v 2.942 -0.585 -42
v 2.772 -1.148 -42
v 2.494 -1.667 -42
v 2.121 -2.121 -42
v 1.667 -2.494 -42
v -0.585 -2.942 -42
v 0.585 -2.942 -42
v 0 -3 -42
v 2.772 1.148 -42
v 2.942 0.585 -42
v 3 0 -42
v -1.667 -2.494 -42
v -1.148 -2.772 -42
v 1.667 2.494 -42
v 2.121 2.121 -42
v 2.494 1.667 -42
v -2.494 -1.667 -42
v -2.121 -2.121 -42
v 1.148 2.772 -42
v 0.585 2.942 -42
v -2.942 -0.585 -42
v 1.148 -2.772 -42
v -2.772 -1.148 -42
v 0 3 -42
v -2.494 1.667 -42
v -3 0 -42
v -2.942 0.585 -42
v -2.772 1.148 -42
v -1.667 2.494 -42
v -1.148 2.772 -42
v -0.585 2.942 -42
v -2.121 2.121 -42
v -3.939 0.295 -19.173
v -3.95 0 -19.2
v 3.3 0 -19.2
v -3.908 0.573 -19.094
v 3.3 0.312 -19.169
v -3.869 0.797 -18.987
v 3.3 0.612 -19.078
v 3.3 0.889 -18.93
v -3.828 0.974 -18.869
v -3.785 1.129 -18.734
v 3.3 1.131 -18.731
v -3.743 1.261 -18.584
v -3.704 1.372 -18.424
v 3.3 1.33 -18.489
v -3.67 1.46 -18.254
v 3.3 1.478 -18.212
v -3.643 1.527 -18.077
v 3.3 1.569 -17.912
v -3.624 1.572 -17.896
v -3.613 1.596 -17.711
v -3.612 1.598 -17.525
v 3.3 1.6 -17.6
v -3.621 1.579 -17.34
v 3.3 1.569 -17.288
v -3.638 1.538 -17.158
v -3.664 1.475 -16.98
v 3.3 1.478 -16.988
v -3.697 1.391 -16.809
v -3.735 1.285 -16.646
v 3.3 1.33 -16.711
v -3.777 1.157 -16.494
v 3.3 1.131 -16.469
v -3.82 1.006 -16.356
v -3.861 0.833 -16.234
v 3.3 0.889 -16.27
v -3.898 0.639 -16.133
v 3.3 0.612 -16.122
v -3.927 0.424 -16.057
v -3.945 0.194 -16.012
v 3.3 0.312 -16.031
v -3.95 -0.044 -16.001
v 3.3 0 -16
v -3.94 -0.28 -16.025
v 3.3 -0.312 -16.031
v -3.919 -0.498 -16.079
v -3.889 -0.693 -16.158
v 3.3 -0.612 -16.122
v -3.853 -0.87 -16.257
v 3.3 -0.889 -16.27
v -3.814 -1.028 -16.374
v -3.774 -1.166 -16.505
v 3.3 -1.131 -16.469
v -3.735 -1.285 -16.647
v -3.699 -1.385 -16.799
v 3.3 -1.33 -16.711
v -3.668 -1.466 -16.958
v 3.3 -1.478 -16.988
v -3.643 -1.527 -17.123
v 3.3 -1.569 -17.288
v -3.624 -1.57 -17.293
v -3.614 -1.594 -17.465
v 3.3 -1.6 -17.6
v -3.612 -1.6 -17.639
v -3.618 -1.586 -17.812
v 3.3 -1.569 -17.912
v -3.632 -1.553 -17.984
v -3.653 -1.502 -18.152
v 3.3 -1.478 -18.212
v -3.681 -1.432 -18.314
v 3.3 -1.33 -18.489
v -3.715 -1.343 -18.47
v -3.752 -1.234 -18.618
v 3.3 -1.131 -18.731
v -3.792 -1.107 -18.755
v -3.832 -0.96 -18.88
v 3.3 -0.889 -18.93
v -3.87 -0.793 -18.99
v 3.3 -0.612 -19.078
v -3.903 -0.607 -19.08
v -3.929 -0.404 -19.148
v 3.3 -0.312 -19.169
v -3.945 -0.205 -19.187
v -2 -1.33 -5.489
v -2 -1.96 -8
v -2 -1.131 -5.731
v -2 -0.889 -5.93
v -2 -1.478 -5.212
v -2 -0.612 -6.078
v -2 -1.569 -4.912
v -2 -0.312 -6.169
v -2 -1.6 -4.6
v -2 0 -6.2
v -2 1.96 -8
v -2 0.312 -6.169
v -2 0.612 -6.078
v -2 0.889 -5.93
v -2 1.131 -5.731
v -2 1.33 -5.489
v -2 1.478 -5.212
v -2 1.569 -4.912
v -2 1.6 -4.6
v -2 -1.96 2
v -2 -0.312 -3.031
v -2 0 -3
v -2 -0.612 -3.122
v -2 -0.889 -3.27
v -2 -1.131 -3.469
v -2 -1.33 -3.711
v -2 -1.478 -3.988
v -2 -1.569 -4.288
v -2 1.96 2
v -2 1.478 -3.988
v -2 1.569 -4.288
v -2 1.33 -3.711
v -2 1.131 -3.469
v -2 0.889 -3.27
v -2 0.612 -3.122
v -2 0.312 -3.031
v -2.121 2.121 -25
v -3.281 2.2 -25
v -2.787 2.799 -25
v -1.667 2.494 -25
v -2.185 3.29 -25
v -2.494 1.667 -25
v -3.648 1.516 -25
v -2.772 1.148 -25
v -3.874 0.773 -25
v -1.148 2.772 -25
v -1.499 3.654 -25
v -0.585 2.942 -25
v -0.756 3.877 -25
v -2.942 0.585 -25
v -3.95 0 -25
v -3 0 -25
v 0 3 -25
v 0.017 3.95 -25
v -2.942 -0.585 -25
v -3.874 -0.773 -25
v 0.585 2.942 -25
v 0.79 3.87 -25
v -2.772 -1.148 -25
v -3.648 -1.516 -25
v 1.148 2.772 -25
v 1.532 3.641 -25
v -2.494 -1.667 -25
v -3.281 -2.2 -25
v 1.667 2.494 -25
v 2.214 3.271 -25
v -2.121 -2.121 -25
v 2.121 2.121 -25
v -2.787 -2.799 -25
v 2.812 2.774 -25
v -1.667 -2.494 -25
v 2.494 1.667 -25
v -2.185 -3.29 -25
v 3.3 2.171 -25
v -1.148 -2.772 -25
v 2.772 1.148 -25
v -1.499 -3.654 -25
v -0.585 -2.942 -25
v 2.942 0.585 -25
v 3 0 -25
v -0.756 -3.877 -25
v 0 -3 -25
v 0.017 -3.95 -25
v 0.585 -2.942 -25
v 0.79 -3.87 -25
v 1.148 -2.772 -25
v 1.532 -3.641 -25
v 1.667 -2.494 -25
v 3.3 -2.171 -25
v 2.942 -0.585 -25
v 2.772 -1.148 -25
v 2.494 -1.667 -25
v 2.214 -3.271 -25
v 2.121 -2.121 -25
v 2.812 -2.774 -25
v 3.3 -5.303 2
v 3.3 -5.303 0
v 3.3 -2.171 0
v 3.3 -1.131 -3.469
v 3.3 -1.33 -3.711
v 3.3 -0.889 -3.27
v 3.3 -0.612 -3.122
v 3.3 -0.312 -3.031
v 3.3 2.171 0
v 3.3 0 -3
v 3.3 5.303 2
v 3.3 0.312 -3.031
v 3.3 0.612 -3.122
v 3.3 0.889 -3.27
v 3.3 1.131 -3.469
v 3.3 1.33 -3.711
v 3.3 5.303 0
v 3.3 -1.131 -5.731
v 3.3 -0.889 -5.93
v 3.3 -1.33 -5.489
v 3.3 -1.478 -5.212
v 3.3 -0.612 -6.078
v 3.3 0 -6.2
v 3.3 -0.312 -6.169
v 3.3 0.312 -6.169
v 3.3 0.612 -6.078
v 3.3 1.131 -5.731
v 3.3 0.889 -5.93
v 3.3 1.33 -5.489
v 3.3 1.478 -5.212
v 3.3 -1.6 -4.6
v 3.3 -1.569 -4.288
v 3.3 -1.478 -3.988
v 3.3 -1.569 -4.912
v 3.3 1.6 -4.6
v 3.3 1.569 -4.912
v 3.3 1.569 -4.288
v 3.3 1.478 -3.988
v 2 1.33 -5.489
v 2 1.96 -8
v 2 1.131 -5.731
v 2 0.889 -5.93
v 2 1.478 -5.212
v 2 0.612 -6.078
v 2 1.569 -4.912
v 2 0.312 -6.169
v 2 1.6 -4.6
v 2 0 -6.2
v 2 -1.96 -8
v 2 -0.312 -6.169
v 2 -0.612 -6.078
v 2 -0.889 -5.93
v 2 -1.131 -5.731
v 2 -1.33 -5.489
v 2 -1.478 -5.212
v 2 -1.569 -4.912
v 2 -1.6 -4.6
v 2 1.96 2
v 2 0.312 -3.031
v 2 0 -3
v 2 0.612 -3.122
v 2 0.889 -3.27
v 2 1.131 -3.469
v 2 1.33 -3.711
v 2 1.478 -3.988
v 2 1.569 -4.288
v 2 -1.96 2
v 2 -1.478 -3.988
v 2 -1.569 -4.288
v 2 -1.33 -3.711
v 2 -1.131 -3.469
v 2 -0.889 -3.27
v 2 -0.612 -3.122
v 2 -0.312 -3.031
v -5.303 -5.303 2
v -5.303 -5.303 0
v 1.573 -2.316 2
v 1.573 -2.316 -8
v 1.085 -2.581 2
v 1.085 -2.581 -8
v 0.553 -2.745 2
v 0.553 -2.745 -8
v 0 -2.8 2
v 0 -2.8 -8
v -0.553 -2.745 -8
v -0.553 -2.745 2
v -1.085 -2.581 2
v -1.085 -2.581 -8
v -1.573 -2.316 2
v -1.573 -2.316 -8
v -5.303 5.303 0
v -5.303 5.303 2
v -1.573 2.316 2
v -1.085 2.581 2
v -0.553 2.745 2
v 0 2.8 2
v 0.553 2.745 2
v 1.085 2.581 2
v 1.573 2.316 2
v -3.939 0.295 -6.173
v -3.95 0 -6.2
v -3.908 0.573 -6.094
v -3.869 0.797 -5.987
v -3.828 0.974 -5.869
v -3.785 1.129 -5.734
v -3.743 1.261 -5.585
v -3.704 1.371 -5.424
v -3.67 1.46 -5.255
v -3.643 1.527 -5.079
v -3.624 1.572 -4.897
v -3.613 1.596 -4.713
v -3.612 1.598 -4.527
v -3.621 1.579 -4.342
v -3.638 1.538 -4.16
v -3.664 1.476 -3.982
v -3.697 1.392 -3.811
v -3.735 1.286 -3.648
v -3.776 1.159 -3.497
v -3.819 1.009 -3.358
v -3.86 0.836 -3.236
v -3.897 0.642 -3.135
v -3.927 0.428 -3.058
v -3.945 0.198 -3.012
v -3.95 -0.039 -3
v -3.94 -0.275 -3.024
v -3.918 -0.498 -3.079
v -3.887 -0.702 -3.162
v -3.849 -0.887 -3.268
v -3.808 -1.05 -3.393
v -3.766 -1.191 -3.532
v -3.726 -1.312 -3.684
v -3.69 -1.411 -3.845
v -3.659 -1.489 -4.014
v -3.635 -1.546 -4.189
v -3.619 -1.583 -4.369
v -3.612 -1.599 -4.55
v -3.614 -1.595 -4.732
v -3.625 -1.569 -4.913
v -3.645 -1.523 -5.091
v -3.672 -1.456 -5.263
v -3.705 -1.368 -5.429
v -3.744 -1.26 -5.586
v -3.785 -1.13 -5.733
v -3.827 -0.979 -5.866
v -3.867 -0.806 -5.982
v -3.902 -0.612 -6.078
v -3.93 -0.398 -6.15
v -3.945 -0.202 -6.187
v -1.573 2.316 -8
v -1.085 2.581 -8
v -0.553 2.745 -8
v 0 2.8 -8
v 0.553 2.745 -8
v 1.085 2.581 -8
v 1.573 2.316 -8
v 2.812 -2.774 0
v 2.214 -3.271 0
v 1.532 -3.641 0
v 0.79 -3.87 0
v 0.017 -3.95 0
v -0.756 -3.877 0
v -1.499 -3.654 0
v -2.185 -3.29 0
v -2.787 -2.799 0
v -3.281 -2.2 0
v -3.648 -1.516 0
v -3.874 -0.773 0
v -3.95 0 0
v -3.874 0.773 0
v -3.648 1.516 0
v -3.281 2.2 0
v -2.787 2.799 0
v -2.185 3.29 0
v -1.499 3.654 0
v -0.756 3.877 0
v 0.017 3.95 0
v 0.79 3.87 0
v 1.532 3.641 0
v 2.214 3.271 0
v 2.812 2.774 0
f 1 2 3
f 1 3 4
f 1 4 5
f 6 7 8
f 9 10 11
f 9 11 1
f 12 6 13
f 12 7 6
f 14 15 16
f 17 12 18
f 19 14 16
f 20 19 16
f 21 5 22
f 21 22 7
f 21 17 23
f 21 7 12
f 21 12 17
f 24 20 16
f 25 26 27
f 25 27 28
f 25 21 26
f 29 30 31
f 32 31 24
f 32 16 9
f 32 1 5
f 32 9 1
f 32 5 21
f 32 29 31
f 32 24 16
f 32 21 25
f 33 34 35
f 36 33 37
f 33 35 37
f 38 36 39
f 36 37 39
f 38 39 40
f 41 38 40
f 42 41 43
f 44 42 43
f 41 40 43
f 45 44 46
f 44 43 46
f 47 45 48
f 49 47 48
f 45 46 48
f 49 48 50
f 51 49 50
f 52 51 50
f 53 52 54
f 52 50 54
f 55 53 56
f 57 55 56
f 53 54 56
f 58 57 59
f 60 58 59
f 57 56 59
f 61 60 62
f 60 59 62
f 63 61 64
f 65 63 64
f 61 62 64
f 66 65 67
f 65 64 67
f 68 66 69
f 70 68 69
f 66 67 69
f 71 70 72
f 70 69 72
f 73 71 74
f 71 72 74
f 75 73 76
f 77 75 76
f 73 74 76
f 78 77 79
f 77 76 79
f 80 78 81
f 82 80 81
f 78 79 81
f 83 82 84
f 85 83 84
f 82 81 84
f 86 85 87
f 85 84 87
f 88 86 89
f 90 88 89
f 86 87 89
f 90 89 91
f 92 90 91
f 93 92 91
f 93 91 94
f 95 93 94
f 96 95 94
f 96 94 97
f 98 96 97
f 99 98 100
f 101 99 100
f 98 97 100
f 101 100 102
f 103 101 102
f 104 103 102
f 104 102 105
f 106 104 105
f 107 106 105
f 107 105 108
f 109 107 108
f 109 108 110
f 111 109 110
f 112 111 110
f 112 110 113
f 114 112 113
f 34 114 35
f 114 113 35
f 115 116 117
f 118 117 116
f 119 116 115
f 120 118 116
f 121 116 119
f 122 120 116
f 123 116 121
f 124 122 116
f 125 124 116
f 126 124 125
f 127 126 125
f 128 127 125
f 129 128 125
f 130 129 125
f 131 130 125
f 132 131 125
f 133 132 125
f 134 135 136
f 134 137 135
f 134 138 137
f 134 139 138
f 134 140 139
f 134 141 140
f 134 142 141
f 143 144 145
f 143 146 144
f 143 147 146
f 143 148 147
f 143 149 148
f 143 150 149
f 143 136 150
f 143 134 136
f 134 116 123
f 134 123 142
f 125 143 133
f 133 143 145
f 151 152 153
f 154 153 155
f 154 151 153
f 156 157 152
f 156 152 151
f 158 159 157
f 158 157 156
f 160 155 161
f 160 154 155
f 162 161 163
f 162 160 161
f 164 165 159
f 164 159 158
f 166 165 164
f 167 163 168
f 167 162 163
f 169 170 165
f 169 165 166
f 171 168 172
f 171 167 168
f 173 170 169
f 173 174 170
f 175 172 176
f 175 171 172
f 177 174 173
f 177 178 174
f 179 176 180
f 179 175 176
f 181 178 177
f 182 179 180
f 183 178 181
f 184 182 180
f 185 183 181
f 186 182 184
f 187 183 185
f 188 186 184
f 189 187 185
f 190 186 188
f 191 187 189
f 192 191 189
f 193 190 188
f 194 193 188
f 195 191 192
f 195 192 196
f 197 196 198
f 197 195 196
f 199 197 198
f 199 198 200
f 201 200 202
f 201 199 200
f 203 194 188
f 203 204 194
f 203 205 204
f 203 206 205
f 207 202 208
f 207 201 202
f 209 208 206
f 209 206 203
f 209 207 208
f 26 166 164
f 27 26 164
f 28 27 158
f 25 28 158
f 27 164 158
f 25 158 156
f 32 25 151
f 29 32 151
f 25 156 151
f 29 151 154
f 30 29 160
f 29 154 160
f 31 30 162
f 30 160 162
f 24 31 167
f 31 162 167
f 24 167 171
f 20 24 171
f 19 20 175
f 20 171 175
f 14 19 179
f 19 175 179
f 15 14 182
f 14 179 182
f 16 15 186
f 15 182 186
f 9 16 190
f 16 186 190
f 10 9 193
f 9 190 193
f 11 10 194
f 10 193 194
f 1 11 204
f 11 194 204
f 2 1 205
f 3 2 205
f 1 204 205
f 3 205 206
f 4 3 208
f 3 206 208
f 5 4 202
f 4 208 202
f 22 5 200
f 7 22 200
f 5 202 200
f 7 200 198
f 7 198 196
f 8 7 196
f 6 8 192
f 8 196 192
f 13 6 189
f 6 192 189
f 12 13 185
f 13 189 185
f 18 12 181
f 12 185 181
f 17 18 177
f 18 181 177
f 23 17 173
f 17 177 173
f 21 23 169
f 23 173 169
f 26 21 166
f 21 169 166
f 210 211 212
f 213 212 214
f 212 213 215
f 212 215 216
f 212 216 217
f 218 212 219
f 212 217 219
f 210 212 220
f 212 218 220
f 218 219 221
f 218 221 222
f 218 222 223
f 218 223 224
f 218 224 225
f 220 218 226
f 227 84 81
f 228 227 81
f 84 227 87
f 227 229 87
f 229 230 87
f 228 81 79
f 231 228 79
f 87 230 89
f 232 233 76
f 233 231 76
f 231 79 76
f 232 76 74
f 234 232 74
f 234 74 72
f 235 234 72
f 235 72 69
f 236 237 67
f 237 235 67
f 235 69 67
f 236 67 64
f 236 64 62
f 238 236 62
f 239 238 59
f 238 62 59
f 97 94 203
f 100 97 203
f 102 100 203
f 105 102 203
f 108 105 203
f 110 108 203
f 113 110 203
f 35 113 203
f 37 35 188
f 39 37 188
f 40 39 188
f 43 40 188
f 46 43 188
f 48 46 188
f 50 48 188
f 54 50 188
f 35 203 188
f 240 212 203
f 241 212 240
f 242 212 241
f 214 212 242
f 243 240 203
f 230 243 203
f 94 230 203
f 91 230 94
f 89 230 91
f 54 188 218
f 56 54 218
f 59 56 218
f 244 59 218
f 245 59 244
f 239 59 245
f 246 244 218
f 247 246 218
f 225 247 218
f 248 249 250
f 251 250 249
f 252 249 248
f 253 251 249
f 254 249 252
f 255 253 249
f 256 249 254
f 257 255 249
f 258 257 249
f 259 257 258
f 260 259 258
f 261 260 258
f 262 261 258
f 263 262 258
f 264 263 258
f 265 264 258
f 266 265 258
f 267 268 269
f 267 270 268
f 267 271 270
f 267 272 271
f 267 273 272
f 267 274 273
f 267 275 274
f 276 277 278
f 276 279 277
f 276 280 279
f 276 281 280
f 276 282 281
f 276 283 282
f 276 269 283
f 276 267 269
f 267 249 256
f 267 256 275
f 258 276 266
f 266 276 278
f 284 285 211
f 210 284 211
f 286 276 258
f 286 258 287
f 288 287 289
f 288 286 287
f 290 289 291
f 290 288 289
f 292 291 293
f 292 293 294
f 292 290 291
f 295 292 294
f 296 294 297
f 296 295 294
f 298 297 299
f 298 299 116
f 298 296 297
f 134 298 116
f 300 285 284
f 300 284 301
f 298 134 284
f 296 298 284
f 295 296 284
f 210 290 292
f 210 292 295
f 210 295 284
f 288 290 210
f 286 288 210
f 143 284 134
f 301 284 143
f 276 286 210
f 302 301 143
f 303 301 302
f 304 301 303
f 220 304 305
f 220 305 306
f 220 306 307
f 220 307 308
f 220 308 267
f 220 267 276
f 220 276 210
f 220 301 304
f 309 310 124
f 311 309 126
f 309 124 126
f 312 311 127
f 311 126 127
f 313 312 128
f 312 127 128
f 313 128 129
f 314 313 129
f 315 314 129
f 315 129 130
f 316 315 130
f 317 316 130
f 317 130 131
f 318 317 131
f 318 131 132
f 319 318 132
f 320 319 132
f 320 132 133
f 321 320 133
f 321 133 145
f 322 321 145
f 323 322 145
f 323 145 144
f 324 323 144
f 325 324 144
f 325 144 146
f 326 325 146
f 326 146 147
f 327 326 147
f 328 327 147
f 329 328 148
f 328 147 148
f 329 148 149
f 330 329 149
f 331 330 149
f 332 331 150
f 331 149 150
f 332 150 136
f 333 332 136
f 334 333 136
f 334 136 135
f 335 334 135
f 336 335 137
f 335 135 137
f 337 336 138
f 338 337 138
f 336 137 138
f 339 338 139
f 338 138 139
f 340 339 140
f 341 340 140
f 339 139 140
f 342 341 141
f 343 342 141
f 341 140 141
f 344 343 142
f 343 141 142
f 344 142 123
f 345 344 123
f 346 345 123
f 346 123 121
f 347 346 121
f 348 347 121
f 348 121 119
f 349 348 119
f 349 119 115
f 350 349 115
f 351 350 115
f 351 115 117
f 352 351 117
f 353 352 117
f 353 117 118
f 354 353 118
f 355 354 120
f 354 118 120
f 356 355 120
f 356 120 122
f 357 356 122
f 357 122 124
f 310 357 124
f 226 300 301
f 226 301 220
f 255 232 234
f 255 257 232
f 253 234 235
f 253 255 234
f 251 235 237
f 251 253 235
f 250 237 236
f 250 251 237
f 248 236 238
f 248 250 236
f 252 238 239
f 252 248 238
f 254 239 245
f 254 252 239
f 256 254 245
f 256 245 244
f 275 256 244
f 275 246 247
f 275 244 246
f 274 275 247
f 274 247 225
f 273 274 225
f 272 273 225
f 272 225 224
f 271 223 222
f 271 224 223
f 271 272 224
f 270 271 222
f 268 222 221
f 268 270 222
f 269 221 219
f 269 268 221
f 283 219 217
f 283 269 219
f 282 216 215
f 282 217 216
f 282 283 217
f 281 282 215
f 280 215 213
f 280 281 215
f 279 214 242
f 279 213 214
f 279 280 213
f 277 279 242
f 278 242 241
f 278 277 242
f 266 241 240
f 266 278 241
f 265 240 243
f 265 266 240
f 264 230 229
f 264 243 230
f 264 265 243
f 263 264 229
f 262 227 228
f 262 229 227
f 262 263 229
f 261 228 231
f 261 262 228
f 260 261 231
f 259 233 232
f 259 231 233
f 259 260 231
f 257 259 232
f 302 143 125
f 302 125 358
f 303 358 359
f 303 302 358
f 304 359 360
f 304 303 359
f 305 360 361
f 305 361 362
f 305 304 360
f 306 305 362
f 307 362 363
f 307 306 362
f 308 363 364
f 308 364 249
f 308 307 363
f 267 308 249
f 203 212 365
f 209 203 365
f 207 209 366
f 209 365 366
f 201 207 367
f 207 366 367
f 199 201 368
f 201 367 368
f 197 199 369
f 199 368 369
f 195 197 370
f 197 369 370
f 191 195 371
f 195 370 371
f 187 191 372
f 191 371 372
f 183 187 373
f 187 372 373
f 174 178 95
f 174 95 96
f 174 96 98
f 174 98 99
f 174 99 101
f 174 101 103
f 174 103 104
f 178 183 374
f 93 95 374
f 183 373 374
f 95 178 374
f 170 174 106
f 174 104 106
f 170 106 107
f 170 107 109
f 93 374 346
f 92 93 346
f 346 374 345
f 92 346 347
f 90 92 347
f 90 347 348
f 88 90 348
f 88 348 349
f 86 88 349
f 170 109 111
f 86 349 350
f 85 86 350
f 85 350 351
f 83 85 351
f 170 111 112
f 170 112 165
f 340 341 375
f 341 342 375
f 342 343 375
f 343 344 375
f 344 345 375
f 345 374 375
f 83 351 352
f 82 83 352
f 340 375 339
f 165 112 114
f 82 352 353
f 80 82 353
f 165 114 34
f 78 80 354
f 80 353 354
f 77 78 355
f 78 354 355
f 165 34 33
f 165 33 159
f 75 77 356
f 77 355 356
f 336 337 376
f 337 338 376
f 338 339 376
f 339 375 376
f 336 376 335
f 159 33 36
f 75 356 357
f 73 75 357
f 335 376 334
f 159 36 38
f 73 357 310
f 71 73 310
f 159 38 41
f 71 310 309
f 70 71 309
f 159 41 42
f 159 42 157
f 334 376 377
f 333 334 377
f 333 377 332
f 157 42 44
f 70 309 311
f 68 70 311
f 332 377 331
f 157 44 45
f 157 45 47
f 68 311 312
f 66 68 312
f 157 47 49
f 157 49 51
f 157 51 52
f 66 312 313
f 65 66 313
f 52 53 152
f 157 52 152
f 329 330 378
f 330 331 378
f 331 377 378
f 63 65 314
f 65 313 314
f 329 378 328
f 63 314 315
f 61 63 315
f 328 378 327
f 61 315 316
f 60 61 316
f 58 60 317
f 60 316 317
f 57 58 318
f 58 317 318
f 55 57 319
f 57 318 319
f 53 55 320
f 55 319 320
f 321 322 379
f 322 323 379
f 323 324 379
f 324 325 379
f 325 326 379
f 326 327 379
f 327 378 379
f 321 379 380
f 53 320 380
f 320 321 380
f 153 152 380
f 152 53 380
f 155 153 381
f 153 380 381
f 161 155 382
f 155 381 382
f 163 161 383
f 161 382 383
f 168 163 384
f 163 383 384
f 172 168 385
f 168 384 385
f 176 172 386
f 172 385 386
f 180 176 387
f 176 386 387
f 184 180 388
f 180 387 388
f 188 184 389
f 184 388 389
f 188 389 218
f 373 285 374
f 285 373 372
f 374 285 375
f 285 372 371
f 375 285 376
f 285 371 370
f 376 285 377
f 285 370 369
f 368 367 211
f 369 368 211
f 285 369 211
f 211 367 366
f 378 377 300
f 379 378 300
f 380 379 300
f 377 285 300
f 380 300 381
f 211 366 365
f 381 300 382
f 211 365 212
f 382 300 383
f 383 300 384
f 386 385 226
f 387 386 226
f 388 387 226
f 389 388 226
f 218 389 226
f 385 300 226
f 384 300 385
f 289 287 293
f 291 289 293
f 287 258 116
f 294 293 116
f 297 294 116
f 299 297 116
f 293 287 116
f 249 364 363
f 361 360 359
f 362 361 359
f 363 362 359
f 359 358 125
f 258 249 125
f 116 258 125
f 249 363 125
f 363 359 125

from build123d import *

# Parameters (mm, degrees)
IZIM1_W                     = 10.606601718
IZIM1_H                     = 10.606601718
Y_KSEKLIK_EKSTR_ZYON1_DEPTH = 2
IZIM2_R                     = 3.95
Y_KSEKLIK_EKSTR_ZYON2_DEPTH = 25
KES_EKSTR_ZYON1_DEPTH       = 10
IZIM5_R                     = 1.6
KES_EKSTR_ZYON3_DEPTH       = 26
IZIM8_W                     = 5
IZIM8_H                     = 13.621024602
KES_EKSTR_ZYON4_DEPTH       = 29.022312538
SKETCH2_R                   = 3
BOSS_EXTRUDE1_DEPTH         = 17


with BuildPart() as part:
    # Çizim1 → Yükseklik-Ekstrüzyon1 (new body)
    with BuildSketch(Plane.XY):
        Rectangle(IZIM1_W, IZIM1_H)
    extrude(amount=Y_KSEKLIK_EKSTR_ZYON1_DEPTH)

    # Çizim2 → Yükseklik-Ekstrüzyon2 (add)
    with BuildSketch(Plane(origin=(0, 0, 0), x_dir=(-1, 0, 0), z_dir=(0, 0, -1))):
        with Locations(Location((0, 0, 0), (0, 0, 180))):
            Circle(IZIM2_R)
    extrude(amount=Y_KSEKLIK_EKSTR_ZYON2_DEPTH)

    # Çizim3 → Kes-Ekstrüzyon1 (cut)
    with BuildSketch(Plane.XY.offset(2)):
        with BuildLine():
            Line((-2, -1.959591794), (-2, 1.959591794))
            ThreePointArc((-2, 1.959591794), (0, 2.8), (2, 1.959591794))
            Line((2, 1.959591794), (2, -1.959591794))
            ThreePointArc((2, -1.959591794), (0, -2.8), (-2, -1.959591794))
        make_face()
    extrude(amount=-KES_EKSTR_ZYON1_DEPTH, mode=Mode.SUBTRACT)

    # Çizim5 → Kes-Ekstrüzyon3 (cut, symmetric)
    with BuildSketch(Plane(origin=(0, 0, 0), x_dir=(0, 0, -1), z_dir=(1, 0, 0))):
        with Locations((4.6, 0)):
            Circle(IZIM5_R)
        with Locations((17.6, 0)):
            Circle(IZIM5_R)
    extrude(amount=KES_EKSTR_ZYON3_DEPTH, both=True, mode=Mode.SUBTRACT)

    # Çizim8 → Kes-Ekstrüzyon4 (cut, through all)
    with BuildSketch(Plane(origin=(0, 0, -25), x_dir=(-1, 0, 0), z_dir=(0, 0, -1))):
        with Locations((-5.8, 0)):
            Rectangle(IZIM8_W, IZIM8_H)
    extrude(amount=-KES_EKSTR_ZYON4_DEPTH, mode=Mode.SUBTRACT)

    # Sketch2 → Boss-Extrude1 (add)
    with BuildSketch(Plane(origin=(0, 0, -25), x_dir=(-1, 0, 0), z_dir=(0, 0, -1))):
        Circle(SKETCH2_R)
    extrude(amount=BOSS_EXTRUDE1_DEPTH)


solid = part.part
